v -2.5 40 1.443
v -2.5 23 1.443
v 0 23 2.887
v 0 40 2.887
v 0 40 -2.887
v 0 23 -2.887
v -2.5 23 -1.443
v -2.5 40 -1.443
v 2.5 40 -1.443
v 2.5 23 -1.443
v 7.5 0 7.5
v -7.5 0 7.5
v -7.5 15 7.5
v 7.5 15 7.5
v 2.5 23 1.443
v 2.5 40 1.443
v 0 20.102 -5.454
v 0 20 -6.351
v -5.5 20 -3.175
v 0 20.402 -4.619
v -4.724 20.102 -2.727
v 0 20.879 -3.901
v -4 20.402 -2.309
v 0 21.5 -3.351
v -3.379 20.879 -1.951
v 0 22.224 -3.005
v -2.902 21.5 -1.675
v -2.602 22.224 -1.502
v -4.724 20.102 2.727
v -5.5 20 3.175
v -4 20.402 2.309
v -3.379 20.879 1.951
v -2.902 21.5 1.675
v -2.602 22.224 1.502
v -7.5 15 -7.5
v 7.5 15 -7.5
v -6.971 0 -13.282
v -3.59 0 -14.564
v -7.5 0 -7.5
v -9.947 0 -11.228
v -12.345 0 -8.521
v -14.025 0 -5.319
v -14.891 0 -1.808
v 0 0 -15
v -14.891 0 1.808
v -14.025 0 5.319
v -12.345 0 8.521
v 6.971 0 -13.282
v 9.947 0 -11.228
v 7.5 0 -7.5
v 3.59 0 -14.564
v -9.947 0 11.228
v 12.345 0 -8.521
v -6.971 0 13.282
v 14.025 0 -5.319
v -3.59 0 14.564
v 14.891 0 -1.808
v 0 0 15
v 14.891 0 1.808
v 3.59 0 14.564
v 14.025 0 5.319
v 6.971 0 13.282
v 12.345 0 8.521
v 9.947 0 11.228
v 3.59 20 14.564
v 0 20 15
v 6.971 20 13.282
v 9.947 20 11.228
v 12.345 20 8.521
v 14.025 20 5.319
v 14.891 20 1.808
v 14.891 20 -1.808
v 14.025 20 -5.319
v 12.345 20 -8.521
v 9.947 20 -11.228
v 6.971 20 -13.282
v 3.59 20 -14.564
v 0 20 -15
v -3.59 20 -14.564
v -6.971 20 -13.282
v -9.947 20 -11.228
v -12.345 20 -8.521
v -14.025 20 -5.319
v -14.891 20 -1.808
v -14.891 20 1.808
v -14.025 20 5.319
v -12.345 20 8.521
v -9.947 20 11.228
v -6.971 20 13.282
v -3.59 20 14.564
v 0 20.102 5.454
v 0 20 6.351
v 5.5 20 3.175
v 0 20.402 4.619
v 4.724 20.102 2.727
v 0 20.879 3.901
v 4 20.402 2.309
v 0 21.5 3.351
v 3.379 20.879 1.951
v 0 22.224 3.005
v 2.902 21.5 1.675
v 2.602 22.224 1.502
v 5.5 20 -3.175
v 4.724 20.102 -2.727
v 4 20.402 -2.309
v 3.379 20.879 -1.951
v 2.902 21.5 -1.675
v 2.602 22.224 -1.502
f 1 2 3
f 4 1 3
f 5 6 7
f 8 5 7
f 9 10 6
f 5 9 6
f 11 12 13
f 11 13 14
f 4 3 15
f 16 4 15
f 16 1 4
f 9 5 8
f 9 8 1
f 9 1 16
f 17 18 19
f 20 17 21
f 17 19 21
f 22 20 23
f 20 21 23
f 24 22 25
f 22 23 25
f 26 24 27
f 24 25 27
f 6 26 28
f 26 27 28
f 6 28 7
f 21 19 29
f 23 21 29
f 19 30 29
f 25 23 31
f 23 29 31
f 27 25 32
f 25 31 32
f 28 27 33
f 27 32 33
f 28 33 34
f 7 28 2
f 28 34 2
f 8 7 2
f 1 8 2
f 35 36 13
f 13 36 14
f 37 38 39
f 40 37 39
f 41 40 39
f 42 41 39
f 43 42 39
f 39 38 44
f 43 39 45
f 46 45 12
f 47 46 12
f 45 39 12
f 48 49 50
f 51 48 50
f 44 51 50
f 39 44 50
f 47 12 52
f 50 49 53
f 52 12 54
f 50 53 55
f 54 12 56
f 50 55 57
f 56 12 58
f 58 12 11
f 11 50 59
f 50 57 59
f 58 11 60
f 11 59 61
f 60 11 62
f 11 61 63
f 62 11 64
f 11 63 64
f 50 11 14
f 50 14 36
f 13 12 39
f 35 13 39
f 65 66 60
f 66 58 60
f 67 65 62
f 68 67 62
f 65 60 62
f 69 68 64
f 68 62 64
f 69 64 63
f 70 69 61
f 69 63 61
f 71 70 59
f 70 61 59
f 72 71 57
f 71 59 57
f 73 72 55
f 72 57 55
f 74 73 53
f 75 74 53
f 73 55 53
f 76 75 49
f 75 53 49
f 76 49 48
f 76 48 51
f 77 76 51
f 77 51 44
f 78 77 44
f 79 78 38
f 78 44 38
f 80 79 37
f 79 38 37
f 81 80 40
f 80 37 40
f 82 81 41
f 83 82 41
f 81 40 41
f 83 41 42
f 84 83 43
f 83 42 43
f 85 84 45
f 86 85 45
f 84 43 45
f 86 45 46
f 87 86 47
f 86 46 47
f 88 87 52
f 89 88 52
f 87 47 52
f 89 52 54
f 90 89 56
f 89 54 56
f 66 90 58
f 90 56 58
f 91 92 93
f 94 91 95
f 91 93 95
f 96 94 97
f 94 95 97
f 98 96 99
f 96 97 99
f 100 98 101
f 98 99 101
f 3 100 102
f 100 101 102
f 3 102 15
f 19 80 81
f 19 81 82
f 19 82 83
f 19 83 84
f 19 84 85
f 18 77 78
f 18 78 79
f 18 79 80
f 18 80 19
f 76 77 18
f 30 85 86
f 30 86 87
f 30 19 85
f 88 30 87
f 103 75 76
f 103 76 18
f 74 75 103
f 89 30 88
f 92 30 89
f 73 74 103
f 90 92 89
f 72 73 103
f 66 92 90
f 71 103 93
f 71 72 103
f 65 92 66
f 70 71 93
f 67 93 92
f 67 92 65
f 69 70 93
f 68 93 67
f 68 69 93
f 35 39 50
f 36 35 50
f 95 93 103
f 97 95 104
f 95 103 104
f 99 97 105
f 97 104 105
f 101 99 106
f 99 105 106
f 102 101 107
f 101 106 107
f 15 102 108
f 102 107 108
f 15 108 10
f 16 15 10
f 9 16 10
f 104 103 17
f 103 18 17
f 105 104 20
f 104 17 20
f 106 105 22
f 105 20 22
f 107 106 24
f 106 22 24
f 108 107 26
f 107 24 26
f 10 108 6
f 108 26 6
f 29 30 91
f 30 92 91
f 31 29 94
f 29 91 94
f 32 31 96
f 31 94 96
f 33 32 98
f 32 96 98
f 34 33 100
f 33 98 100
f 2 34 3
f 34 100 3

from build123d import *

# Parameters (mm, degrees)
SKETCH1_R           = 15
SKETCH1_W           = 15
SKETCH1_H           = 15
BOSS_EXTRUDE1_DEPTH = 15
SKETCH2_R           = 15
BOSS_EXTRUDE2_DEPTH = 5
BOSS_EXTRUDE3_DEPTH = 20
FILLET1_R           = 3


with BuildPart() as part:
    # Sketch1 → Boss-Extrude1 (new body)
    with BuildSketch(Plane(origin=(0, 0, 0), x_dir=(1, 0, 0), z_dir=(0, 1, 0))):
        with Locations(Location((0, 0, 0), (0, 0, 270))):
            Circle(SKETCH1_R)
        Rectangle(SKETCH1_W, SKETCH1_H, mode=Mode.SUBTRACT)
    extrude(amount=BOSS_EXTRUDE1_DEPTH)

    # Sketch2 → Boss-Extrude2 (add)
    with BuildSketch(Plane(origin=(0, 15, 0), x_dir=(1, 0, 0), z_dir=(0, 1, 0))):
        with Locations(Location((0, 0, 0), (0, 0, 270))):
            Circle(SKETCH2_R)
    extrude(amount=BOSS_EXTRUDE2_DEPTH)

    # Sketch3 → Boss-Extrude3 (add)
    with BuildSketch(Plane(origin=(0, 20, 0), x_dir=(1, 0, 0), z_dir=(0, 1, 0))):
        Polygon((2.5, -1.443375673), (2.5, 1.443375673), (0, 2.886751346), (-2.5, 1.443375673), (-2.5, -1.443375673), (0, -2.886751346), align=None)
    extrude(amount=BOSS_EXTRUDE3_DEPTH)

    # Fillet1
    fillet1_edges = [part.edges().sort_by_distance(p)[0] for p in [
        (2.5, 20, 0),
        (1.25, 20, -2.165063509),
        (-1.25, 20, -2.165063509),
        (-2.5, 20, 0),
        (-1.25, 20, 2.165063509),
        (1.25, 20, 2.165063509),
    ]]
    fillet(fillet1_edges, radius=FILLET1_R)


solid = part.part
